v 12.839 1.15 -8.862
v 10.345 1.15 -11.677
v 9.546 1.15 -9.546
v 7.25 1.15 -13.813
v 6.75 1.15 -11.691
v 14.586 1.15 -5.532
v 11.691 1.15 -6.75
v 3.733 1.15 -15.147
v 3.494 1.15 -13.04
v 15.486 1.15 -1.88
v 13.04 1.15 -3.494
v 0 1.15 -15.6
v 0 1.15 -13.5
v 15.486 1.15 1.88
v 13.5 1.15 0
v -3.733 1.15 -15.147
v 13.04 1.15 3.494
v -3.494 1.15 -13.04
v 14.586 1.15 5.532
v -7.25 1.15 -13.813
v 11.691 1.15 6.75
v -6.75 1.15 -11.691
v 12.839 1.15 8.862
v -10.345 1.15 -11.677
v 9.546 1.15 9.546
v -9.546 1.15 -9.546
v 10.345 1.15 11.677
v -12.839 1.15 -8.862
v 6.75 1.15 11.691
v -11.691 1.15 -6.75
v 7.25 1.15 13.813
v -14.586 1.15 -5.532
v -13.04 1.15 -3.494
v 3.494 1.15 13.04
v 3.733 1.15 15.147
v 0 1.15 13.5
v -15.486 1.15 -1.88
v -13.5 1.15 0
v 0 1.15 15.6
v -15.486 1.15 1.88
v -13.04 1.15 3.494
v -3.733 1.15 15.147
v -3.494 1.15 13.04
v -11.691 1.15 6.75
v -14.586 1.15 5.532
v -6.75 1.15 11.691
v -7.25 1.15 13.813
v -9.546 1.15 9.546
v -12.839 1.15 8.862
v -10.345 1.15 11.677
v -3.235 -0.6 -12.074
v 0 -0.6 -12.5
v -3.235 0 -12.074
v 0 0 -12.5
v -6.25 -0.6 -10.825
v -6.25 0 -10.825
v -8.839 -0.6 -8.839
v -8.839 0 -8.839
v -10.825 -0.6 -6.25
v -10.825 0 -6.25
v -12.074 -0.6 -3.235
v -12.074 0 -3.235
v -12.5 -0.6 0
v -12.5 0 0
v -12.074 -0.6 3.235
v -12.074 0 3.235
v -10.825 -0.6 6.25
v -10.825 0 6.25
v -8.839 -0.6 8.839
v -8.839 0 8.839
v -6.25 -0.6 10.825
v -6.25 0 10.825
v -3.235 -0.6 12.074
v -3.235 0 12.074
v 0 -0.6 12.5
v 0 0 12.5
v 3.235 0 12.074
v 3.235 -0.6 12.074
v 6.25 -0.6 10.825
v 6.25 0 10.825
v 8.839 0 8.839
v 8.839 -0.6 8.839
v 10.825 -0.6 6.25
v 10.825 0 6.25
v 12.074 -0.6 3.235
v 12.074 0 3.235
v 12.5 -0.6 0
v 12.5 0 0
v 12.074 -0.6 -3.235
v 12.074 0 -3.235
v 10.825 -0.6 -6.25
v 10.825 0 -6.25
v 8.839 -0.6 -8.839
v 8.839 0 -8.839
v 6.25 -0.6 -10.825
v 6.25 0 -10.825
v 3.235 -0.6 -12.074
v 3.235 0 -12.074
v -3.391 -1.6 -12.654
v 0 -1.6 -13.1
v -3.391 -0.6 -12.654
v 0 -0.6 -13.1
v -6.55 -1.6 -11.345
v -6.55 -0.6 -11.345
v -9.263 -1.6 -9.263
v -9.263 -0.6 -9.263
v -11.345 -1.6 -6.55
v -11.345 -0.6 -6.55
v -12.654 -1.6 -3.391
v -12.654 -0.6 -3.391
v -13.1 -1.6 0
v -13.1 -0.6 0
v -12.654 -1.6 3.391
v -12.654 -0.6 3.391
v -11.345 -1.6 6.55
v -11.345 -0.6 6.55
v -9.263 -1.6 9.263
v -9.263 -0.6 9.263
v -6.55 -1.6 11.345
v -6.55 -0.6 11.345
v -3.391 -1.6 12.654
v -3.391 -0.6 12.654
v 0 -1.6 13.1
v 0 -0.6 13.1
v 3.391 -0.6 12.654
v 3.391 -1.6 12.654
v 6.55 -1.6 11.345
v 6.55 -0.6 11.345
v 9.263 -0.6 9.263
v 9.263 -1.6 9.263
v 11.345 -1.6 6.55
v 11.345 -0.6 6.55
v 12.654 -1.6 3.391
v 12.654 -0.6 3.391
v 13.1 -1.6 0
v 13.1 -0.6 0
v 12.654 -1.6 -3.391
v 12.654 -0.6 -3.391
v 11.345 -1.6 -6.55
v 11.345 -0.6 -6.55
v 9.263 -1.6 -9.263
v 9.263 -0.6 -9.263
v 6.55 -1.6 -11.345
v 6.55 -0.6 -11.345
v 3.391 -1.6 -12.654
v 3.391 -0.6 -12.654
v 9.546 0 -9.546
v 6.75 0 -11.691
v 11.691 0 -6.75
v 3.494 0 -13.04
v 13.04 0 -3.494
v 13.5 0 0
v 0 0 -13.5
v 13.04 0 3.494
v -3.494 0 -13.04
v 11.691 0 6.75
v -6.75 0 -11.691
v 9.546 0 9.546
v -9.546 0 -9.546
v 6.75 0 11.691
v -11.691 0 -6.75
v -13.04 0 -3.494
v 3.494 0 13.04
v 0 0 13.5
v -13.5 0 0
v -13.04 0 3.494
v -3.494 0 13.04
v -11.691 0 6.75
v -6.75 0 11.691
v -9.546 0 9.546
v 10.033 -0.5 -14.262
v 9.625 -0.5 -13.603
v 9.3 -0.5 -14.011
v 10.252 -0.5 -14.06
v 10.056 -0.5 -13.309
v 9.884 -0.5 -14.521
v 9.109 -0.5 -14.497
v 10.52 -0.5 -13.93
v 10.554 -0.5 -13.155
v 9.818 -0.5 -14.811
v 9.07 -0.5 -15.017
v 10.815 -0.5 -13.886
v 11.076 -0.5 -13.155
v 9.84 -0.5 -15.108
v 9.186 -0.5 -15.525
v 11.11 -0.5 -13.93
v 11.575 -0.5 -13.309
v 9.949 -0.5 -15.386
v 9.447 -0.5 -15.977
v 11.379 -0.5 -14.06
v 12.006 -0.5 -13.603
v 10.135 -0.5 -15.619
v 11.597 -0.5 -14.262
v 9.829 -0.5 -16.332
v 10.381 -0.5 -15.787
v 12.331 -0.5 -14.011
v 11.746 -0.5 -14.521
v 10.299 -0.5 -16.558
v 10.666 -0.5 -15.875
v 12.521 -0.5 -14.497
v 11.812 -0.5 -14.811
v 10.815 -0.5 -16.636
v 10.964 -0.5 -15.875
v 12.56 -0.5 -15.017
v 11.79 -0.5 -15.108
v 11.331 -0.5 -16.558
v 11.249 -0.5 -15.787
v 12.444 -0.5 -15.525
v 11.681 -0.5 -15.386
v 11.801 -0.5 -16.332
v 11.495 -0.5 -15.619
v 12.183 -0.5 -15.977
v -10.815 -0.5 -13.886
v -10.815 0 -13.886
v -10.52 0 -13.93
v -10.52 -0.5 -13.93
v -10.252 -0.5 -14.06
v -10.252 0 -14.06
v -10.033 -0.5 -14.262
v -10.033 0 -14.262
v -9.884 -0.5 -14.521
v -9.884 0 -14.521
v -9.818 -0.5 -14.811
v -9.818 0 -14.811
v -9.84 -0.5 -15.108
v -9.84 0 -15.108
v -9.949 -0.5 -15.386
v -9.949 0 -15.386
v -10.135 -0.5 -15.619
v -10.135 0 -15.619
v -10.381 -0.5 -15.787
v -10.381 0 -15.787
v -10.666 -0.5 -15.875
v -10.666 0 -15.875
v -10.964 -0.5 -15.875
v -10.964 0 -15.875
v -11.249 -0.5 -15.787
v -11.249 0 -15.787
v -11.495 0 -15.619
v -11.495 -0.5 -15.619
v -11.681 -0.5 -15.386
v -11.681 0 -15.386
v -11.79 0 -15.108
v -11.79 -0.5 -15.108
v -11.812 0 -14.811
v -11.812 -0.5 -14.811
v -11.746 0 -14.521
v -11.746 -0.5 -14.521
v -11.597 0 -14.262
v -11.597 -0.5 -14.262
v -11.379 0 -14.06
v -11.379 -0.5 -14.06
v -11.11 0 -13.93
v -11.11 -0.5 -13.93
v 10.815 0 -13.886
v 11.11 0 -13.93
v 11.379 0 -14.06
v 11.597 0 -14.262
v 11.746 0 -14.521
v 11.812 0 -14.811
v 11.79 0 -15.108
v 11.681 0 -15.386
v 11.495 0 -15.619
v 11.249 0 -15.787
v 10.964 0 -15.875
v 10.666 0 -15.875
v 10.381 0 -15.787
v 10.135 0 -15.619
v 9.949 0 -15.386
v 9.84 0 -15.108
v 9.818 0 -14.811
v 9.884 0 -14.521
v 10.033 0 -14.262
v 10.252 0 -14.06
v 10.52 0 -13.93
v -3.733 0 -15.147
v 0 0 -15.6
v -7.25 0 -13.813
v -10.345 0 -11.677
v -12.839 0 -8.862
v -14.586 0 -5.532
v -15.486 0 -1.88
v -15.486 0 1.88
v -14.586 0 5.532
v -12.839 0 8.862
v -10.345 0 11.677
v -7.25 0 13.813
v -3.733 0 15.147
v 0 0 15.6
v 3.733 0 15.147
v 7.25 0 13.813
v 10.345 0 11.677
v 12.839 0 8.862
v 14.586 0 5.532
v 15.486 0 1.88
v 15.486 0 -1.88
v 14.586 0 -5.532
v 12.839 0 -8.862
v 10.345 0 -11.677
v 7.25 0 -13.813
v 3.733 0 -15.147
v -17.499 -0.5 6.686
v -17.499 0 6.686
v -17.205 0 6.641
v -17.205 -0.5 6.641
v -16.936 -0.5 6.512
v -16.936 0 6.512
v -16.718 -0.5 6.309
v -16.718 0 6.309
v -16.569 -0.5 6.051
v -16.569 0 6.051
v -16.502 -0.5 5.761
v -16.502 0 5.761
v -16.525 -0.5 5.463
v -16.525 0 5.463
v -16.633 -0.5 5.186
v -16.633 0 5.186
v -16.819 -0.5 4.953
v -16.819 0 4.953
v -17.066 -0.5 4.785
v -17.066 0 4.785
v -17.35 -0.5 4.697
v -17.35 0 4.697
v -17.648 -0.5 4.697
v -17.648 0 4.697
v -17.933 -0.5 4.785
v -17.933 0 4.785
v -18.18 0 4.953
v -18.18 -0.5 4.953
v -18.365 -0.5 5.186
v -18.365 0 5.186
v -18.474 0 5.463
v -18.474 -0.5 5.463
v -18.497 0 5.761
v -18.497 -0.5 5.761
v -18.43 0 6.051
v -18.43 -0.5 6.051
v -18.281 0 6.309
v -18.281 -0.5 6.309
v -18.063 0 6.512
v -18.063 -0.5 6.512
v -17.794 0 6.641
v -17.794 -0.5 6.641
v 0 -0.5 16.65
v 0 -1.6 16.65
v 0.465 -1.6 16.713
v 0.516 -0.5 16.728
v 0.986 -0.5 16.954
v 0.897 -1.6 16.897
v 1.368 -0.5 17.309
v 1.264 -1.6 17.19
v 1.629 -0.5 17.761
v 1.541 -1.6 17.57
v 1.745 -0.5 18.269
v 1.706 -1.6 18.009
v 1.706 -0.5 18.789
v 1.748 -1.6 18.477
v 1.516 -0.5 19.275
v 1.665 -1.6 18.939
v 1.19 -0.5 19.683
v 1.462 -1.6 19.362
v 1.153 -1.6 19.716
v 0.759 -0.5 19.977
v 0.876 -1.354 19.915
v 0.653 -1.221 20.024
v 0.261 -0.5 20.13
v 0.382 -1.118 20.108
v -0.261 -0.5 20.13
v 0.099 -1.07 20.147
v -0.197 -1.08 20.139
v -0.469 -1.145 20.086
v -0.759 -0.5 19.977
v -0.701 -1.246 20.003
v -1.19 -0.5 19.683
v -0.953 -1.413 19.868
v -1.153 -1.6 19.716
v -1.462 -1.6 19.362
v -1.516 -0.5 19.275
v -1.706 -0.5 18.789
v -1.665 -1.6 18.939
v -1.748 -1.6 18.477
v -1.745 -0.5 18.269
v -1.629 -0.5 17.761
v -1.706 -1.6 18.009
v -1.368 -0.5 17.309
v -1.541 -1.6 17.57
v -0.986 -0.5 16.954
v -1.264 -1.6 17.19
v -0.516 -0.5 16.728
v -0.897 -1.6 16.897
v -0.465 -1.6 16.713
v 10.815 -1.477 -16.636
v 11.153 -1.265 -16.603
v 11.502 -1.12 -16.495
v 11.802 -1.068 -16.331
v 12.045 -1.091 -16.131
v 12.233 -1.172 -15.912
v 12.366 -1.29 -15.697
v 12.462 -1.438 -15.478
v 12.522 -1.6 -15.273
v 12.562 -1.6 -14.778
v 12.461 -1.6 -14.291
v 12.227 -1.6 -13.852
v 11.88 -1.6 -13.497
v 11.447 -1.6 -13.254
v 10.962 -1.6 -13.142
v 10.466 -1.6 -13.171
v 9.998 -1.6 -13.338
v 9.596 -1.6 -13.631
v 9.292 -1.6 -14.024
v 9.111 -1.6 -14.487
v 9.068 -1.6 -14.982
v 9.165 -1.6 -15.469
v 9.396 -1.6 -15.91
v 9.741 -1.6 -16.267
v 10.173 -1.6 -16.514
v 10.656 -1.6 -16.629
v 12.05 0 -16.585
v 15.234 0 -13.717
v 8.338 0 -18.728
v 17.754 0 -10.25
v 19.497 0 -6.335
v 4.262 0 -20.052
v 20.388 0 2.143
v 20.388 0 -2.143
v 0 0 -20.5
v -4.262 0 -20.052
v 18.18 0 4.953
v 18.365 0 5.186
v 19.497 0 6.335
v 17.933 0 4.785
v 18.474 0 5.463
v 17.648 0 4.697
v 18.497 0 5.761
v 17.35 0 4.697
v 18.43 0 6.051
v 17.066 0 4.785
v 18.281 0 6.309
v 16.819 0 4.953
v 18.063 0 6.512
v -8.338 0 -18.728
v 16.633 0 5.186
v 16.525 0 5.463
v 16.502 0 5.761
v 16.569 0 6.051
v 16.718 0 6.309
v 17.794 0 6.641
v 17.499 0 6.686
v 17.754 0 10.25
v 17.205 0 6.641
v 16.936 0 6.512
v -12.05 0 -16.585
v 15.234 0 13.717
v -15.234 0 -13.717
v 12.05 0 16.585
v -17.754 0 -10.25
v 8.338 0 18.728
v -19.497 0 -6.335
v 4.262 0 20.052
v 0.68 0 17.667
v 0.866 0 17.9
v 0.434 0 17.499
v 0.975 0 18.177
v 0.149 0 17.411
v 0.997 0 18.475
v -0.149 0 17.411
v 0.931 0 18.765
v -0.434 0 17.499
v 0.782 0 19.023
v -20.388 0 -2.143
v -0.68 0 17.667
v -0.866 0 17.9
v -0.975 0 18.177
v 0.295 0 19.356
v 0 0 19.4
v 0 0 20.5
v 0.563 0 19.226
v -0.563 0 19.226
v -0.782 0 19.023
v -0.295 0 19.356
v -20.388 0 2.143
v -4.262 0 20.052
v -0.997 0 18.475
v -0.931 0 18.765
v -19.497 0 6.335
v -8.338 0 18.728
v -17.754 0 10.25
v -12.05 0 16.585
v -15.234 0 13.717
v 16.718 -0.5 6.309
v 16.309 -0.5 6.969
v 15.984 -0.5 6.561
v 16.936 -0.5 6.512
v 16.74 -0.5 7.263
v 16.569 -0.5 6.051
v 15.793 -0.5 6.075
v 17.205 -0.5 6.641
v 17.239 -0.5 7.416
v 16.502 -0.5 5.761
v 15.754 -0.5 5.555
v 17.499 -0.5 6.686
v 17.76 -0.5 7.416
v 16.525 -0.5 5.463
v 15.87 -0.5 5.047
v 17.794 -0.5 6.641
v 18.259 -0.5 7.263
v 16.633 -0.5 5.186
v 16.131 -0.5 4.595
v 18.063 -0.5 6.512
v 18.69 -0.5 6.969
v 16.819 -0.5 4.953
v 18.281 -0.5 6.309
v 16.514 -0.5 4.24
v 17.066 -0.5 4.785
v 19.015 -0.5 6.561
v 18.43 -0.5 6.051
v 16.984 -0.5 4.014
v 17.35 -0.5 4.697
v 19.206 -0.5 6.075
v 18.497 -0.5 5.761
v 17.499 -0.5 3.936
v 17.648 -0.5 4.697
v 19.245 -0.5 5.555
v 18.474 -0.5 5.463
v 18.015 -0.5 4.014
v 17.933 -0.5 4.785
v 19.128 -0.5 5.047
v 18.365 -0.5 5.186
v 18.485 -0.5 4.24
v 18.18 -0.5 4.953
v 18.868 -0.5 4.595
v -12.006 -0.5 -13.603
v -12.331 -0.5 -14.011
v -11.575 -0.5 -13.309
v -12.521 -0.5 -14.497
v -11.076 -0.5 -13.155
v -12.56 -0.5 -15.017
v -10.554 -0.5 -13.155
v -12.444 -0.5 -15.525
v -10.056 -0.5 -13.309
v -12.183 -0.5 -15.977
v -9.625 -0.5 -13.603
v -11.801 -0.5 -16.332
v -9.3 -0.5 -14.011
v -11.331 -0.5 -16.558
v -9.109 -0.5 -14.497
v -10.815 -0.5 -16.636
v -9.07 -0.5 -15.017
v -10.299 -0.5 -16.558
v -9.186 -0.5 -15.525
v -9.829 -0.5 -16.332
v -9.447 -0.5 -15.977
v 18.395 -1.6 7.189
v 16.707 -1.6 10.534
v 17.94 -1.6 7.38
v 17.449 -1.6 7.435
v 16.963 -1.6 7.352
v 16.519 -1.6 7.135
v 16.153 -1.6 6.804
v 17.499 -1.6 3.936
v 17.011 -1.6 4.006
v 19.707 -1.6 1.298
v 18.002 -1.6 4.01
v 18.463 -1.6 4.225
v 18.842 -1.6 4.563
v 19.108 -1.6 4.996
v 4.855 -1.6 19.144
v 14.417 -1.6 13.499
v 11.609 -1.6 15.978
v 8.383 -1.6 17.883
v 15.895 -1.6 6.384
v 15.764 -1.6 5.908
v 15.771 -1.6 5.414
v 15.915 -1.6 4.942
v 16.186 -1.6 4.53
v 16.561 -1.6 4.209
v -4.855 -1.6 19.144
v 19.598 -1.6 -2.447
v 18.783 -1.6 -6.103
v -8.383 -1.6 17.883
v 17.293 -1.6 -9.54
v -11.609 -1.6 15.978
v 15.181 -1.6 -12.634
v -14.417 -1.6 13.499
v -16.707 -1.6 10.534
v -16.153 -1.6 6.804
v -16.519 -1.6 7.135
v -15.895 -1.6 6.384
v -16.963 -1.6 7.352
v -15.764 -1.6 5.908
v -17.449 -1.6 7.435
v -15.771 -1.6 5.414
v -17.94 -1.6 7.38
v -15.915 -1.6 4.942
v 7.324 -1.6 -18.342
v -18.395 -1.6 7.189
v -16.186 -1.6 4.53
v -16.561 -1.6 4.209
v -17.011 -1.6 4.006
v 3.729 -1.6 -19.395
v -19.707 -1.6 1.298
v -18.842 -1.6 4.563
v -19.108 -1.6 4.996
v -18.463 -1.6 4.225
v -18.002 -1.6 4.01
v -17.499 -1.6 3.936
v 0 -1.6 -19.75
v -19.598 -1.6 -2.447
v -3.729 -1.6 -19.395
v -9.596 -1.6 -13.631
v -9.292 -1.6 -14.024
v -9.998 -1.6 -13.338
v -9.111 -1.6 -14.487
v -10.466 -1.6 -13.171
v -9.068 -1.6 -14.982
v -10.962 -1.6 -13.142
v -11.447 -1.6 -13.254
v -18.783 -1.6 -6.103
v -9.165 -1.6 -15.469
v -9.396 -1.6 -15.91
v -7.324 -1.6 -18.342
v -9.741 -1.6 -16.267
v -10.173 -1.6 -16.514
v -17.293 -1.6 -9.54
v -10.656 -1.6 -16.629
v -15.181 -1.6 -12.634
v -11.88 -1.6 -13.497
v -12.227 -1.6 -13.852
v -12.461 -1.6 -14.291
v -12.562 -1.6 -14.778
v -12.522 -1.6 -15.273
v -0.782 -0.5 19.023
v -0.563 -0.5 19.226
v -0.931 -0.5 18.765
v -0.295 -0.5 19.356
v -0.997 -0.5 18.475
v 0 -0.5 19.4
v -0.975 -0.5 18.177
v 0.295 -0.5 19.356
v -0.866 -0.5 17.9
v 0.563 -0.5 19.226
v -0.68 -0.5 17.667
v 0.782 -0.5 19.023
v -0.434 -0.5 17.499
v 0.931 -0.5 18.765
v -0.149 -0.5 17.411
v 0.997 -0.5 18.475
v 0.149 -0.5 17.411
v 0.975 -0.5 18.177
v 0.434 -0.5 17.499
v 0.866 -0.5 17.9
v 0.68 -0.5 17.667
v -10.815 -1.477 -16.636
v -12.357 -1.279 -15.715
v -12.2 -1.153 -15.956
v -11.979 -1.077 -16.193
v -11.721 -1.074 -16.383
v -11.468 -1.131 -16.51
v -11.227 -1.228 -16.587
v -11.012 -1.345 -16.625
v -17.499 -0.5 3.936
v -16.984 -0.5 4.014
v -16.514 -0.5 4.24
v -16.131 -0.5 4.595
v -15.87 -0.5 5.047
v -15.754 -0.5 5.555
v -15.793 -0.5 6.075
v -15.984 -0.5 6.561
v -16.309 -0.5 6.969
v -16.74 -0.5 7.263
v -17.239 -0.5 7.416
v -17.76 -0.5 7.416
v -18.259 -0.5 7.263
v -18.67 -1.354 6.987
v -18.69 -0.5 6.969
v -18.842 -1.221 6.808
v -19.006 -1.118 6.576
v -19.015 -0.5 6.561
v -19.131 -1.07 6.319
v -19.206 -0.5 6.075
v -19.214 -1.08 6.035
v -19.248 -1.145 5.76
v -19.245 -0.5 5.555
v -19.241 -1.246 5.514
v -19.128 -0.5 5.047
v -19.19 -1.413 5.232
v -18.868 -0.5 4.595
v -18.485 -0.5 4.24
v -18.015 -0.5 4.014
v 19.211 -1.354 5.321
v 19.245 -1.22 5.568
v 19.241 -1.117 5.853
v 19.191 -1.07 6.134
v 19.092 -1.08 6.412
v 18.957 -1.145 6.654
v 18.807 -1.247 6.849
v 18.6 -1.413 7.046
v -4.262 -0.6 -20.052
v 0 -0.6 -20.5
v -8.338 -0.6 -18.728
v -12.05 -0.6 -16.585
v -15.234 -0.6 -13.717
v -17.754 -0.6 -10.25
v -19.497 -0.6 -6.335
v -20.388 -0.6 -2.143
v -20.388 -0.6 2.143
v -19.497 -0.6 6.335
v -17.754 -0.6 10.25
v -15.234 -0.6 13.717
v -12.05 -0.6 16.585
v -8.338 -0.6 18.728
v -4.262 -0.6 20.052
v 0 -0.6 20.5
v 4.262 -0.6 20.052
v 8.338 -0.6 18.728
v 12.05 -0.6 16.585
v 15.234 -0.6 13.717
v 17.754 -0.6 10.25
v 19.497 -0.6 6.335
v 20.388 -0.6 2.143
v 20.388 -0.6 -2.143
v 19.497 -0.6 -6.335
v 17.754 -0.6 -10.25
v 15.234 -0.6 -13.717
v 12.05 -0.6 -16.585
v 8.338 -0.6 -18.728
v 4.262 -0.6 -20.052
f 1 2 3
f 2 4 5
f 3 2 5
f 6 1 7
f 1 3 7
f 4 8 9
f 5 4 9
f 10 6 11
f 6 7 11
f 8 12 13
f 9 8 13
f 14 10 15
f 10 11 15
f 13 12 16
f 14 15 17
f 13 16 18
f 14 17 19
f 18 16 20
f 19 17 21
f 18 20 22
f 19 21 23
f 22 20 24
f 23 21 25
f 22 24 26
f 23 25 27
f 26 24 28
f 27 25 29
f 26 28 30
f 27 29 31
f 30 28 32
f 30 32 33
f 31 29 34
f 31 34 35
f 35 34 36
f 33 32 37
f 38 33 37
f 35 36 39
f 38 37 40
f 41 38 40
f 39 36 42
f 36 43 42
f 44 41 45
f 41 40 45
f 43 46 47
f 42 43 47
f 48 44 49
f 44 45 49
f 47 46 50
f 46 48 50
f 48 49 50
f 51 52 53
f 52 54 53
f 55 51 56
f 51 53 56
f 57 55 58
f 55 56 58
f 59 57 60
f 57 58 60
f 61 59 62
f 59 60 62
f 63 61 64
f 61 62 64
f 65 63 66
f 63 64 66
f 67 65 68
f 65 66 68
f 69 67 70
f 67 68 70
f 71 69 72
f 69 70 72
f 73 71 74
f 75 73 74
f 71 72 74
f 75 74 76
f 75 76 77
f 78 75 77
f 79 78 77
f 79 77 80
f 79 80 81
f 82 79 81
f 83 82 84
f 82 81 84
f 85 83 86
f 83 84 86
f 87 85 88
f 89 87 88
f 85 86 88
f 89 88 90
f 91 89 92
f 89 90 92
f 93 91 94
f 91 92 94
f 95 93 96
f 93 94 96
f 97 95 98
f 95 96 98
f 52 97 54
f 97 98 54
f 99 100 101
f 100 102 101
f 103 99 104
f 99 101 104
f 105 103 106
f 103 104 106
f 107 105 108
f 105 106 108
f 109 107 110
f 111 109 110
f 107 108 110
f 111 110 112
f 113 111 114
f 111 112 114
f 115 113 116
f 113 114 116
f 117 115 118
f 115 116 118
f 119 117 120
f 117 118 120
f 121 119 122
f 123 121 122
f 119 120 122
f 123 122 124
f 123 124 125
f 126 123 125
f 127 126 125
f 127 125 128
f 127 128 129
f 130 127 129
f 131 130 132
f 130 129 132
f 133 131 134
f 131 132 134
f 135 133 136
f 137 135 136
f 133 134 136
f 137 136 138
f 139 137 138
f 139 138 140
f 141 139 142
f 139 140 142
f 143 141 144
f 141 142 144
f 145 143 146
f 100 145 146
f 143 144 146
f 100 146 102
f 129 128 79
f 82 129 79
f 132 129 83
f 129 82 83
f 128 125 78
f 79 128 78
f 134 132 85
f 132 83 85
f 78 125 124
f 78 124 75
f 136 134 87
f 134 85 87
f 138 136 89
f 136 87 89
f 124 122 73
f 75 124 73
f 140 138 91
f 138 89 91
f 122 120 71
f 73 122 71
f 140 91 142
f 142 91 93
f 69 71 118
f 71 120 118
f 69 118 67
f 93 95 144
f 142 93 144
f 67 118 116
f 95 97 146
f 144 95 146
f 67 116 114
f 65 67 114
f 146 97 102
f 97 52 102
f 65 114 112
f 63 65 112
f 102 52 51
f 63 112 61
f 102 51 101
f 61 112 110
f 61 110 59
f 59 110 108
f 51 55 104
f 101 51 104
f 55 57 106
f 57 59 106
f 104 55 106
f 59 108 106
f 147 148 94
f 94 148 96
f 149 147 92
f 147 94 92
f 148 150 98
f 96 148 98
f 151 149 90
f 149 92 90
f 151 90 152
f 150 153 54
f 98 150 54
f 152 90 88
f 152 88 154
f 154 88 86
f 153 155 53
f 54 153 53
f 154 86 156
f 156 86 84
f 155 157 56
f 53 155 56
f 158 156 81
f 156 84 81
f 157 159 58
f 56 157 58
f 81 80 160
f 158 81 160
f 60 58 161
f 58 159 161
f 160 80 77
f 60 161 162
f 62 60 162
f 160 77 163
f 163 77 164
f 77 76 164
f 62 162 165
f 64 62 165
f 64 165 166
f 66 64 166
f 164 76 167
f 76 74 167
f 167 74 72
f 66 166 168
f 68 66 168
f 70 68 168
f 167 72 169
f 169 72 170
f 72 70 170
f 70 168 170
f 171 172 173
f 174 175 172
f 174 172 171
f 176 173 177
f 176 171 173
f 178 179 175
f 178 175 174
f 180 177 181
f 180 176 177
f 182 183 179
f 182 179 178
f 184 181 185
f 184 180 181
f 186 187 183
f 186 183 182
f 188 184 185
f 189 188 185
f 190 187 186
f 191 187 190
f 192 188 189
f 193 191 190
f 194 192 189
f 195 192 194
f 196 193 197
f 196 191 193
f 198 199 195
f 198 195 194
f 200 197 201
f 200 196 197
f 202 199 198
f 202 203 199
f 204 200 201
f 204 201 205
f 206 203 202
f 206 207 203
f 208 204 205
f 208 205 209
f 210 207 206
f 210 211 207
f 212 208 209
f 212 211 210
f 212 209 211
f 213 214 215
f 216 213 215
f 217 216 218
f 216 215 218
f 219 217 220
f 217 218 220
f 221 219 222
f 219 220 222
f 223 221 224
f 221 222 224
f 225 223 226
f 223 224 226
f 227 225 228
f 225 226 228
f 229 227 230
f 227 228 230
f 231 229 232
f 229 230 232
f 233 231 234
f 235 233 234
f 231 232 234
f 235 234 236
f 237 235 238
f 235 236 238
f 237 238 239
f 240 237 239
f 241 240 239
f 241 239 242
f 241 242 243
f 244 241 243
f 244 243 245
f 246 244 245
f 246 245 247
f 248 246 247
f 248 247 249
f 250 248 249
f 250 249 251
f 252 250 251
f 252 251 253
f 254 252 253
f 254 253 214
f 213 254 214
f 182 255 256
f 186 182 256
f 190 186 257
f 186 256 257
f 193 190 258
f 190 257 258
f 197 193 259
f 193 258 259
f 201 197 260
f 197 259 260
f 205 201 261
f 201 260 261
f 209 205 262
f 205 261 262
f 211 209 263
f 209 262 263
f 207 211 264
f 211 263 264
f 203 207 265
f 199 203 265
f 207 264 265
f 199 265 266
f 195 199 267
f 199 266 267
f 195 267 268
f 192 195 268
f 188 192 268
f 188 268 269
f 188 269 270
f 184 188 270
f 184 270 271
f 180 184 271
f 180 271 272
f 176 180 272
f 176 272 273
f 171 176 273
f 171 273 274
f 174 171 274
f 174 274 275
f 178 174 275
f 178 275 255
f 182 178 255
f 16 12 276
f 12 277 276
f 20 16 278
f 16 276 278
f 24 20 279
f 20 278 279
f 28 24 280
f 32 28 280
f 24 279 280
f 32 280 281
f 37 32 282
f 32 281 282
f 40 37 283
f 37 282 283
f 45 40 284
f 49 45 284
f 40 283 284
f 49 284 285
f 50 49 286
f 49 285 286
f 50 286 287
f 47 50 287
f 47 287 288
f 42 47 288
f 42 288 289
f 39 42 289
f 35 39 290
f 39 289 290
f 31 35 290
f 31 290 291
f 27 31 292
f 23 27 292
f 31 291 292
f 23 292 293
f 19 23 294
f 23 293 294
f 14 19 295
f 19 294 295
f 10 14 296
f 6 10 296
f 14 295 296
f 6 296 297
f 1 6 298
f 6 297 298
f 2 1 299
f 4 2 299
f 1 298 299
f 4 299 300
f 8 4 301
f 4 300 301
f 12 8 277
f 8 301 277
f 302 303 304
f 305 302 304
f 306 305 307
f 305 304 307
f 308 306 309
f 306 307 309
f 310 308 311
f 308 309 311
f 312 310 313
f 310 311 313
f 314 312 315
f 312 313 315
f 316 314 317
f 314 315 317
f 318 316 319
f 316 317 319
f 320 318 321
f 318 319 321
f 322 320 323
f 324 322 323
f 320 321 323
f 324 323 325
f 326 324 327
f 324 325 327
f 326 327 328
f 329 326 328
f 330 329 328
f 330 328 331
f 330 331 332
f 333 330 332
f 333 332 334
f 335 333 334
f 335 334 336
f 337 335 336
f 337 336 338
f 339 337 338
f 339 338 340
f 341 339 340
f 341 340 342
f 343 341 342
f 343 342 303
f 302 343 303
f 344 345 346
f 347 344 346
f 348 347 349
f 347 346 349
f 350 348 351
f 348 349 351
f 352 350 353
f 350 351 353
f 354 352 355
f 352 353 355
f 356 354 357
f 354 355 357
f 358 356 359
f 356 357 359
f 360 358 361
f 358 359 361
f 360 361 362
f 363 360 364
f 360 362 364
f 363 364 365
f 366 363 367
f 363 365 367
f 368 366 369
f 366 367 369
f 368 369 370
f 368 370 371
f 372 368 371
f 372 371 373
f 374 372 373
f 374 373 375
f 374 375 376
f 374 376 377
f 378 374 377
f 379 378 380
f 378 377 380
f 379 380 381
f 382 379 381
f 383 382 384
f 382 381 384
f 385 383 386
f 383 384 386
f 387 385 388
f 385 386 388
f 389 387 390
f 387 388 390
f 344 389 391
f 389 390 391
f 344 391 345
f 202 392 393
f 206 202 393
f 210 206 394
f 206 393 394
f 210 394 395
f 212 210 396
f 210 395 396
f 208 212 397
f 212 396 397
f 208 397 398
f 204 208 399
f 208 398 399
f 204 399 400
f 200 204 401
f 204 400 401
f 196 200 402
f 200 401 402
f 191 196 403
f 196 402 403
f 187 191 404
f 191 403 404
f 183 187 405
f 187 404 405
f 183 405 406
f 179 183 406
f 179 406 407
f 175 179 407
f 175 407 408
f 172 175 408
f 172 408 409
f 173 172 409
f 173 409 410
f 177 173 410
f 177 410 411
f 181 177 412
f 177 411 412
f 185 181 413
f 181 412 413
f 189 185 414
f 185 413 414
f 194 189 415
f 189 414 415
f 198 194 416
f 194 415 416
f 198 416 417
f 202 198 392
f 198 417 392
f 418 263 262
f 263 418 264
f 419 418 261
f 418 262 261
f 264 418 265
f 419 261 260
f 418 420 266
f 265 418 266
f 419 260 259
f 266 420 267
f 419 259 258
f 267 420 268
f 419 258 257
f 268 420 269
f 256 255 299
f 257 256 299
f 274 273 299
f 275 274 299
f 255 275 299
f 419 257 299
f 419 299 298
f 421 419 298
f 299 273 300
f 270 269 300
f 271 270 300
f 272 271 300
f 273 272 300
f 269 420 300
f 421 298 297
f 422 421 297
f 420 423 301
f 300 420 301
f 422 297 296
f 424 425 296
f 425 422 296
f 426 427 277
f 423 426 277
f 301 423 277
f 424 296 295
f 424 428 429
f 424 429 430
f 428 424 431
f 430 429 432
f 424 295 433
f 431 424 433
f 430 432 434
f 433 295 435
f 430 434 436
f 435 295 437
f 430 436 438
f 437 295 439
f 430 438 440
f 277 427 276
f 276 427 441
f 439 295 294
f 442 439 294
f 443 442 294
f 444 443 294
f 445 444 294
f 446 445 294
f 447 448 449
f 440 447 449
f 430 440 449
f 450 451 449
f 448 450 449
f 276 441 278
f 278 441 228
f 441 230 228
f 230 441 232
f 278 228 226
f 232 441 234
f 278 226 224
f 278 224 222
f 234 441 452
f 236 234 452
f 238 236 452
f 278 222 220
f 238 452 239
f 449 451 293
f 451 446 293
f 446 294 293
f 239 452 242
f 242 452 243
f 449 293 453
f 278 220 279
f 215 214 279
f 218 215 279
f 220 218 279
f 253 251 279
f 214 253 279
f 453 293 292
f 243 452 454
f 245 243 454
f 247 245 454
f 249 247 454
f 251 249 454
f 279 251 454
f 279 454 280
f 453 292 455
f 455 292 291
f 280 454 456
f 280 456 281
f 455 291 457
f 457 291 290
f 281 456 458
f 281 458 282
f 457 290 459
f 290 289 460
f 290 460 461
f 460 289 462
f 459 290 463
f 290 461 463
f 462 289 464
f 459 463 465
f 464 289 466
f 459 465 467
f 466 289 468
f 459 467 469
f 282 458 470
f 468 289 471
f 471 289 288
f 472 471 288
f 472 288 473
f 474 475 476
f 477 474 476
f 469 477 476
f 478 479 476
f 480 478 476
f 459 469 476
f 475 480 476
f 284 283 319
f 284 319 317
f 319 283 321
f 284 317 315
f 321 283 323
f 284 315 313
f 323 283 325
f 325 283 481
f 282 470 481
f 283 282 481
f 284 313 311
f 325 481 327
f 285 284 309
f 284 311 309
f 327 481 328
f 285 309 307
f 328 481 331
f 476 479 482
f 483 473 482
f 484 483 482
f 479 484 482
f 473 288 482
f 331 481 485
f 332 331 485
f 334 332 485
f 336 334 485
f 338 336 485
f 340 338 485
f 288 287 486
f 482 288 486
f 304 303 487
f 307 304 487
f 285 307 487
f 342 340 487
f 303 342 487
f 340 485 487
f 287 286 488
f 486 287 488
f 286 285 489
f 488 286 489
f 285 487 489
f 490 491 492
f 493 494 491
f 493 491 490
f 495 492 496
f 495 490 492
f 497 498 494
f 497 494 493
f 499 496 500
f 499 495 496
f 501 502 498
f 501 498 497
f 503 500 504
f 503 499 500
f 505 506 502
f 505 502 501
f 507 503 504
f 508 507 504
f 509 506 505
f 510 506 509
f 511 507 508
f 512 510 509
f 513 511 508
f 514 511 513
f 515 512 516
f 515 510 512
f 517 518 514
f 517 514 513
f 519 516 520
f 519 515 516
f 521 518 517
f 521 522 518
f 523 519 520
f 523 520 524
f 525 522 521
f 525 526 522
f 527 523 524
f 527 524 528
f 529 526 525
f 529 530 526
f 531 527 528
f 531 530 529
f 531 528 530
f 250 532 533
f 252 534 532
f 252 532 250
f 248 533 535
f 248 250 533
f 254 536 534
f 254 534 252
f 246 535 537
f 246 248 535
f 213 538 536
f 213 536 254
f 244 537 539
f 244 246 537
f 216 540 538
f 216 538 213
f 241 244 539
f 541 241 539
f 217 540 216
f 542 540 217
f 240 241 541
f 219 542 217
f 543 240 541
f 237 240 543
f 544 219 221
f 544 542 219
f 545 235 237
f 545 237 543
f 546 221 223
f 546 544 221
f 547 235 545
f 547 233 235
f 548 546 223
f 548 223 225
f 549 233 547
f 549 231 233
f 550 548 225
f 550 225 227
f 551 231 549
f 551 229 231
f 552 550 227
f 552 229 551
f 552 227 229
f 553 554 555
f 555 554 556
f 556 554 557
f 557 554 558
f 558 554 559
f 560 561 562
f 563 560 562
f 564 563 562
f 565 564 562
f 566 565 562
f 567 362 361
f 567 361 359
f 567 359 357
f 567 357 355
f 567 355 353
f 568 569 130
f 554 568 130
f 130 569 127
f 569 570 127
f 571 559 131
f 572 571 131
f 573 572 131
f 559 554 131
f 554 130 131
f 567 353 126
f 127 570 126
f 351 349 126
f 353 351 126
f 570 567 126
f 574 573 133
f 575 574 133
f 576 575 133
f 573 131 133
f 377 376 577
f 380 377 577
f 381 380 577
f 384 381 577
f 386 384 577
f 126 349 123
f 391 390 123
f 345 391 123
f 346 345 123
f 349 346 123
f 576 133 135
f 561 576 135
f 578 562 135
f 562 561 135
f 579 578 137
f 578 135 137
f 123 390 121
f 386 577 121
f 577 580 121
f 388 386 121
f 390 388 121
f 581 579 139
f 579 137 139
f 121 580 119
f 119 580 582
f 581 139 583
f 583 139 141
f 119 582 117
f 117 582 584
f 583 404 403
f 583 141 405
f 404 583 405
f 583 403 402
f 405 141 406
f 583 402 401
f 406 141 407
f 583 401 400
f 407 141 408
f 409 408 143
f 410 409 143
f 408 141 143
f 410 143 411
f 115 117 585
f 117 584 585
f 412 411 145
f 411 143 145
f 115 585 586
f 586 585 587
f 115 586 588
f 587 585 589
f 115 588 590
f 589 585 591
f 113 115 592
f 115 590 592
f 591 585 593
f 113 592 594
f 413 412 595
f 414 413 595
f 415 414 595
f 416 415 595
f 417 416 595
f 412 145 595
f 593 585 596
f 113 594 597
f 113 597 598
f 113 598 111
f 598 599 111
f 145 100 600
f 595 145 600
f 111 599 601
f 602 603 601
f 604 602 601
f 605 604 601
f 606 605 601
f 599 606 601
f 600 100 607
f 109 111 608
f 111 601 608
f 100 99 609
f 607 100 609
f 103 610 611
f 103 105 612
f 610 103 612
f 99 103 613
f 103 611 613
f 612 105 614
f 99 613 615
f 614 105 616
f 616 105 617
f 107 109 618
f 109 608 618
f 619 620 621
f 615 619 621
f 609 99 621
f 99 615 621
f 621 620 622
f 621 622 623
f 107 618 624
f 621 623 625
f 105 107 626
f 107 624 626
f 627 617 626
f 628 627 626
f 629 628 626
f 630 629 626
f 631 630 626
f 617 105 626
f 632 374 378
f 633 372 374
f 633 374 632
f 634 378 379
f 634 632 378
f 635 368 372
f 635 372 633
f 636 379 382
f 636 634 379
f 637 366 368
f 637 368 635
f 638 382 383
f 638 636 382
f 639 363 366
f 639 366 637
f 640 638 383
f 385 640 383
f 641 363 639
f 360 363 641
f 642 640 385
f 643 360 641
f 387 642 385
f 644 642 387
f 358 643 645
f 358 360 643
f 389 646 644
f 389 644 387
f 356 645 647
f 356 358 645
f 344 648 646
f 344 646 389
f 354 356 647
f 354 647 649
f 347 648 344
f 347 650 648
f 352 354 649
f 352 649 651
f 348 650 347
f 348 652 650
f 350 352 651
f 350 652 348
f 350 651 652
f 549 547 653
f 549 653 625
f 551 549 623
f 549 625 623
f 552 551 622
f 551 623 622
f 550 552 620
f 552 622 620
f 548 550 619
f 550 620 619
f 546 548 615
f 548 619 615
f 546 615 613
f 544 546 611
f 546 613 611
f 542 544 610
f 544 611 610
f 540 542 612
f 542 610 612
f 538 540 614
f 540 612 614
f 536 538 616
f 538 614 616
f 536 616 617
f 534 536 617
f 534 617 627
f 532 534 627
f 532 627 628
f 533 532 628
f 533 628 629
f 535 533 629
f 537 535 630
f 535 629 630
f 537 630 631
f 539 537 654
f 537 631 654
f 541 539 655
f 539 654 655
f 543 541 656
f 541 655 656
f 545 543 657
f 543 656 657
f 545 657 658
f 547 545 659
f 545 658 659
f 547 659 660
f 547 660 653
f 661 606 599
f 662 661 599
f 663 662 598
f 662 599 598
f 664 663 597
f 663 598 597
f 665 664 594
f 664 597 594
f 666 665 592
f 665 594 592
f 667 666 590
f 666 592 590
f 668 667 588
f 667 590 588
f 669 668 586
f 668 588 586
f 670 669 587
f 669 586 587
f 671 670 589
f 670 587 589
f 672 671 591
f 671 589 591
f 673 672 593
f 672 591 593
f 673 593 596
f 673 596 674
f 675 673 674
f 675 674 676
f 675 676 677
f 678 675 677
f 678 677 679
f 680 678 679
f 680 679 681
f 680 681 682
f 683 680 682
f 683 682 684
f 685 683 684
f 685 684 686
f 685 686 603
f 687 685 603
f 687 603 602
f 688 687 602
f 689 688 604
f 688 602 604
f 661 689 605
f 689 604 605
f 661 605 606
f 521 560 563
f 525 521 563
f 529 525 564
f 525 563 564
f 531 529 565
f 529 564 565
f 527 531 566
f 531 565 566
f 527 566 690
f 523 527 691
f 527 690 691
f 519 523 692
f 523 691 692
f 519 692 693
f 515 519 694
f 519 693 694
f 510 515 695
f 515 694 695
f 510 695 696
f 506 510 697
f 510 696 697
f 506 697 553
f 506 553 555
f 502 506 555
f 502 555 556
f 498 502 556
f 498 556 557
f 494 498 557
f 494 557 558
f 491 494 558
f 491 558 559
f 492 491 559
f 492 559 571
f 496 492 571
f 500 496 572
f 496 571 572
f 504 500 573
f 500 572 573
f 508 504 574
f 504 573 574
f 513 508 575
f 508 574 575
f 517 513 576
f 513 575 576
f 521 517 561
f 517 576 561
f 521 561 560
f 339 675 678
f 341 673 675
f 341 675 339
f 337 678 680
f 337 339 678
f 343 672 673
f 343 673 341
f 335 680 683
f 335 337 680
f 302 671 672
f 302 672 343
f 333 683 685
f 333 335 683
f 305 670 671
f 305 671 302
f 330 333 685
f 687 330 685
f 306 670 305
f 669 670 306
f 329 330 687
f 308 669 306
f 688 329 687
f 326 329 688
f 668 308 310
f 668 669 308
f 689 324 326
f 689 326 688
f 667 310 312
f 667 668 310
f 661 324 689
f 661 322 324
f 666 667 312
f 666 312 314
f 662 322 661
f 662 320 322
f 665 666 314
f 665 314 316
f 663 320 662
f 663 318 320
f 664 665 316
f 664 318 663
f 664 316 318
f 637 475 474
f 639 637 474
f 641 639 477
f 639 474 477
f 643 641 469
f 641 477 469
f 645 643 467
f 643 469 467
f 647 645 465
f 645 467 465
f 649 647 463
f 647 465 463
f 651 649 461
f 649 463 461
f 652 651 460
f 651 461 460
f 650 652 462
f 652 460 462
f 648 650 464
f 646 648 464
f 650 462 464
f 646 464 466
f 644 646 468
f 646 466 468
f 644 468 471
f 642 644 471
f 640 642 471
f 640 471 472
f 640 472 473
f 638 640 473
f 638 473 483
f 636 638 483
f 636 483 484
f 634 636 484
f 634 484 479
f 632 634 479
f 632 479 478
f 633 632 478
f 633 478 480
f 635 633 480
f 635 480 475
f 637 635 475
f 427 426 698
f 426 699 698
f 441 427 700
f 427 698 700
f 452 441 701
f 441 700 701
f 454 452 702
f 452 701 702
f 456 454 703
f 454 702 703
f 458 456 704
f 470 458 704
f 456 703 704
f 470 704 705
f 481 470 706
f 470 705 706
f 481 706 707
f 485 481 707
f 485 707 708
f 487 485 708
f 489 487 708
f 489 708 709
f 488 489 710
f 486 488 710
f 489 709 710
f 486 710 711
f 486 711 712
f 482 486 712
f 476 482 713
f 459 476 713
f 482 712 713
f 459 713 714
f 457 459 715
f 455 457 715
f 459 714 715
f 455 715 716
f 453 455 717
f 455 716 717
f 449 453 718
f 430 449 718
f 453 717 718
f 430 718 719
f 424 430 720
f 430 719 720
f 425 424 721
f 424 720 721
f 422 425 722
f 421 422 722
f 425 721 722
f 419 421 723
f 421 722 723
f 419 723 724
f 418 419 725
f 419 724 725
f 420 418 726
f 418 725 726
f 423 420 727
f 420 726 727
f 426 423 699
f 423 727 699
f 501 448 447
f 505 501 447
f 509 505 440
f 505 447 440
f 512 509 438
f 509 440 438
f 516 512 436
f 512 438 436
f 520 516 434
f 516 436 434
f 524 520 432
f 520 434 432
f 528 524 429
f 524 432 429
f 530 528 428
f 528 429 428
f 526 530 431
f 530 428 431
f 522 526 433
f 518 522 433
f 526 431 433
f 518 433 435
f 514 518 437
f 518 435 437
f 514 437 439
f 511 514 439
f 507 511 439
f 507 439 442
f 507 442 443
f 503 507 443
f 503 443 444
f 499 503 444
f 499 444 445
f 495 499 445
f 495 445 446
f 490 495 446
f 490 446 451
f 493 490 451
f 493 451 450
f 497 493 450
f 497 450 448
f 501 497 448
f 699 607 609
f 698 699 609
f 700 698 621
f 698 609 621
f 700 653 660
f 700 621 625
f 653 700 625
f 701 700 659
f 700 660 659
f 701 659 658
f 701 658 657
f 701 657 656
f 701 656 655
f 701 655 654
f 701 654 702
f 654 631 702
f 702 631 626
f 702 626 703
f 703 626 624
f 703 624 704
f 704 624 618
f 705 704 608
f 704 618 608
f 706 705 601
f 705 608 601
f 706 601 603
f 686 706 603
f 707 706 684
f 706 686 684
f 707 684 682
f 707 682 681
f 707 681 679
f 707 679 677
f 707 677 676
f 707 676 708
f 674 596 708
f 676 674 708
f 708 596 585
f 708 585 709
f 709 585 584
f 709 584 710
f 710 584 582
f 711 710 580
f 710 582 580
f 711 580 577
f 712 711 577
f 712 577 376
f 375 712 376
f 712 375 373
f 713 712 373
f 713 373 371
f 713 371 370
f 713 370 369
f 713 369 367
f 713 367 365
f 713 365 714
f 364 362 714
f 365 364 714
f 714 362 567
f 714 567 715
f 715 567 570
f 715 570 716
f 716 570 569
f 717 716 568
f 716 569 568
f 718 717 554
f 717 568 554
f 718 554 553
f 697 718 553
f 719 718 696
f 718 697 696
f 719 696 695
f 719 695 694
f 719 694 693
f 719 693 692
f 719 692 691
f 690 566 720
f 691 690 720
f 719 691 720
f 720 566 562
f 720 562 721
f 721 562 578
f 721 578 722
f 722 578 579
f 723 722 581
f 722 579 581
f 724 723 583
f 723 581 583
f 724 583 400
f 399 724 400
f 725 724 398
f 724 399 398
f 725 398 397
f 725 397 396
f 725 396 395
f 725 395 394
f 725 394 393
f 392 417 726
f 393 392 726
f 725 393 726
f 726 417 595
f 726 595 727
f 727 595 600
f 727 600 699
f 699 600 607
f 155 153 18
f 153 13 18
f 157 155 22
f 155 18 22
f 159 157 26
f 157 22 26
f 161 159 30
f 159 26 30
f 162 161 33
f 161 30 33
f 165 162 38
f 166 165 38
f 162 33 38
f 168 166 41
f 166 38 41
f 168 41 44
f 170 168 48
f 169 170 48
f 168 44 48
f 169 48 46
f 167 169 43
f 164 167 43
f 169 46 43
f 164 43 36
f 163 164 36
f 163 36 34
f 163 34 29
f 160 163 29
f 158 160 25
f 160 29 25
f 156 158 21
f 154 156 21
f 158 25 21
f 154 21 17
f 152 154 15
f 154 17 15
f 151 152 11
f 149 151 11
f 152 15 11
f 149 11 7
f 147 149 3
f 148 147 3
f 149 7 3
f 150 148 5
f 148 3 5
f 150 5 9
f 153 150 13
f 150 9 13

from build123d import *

# Parameters (mm, degrees)
ESQUISSE2_R             = 1
ENL_V_MAT_EXTRU_1_DEPTH = 2.6
ESQUISSE3_R             = 1.75
ENL_V_MAT_EXTRU_2_DEPTH = 1.1


with BuildPart() as part:
    # Esquisse1 → Révolution1 (revolve)
    with BuildSketch(Plane(origin=(0, 0, 0), x_dir=(0, 0, -1), z_dir=(1, 0, 0)), mode=Mode.PRIVATE) as r_volution1_sk:
        Polygon((-13.5, 0), (-13.5, 1.15), (-15.6, 1.15), (-15.6, 0), (-20.5, 0), (-20.5, -0.6), (-19.75, -1.6), (-13.1, -1.6), (-13.1, -0.6), (-12.5, -0.6), (-12.5, 0), align=None)
    revolve(r_volution1_sk.sketch.rotate(Axis((0, -40.878639624, 0), (0, 1, 0)), 180), axis=Axis((0, -40.878639624, 0), (0, 1, 0)))  # turned: the seam where the file's is

    # Esquisse2 → Enlèv. mat.-Extru.1 (cut, through all)
    with BuildSketch(Plane(origin=(0, 0, 0), x_dir=(1, 0, 0), z_dir=(0, 1, 0))):
        with Locations(Location((0, -18.4, 0), (0, 0, 270))):  # turned: the seam where the file's is
            Circle(ESQUISSE2_R)
        with Locations(Location((17.4994399, -5.685912696, 0), (0, 0, 270))):  # turned: the seam where the file's is
            Circle(ESQUISSE2_R)
        with Locations(Location((10.815248642, 14.885912696, 0), (0, 0, 270))):  # turned: the seam where the file's is
            Circle(ESQUISSE2_R)
        with Locations(Location((-10.815248642, 14.885912696, 0), (0, 0, 270))):  # turned: the seam where the file's is
            Circle(ESQUISSE2_R)
        with Locations(Location((-17.4994399, -5.685912696, 0), (0, 0, 270))):  # turned: the seam where the file's is
            Circle(ESQUISSE2_R)
    extrude(amount=-ENL_V_MAT_EXTRU_1_DEPTH, mode=Mode.SUBTRACT)

    # Esquisse3 → Enlèv. mat.-Extru.2 (cut)
    with BuildSketch(Plane.XZ.offset(1.6)):
        with Locations(Location((0, 18.4, 0), (0, 0, 270))):  # turned: the seam where the file's is
            Circle(ESQUISSE3_R)
        with Locations(Location((17.4994399, 5.685912696, 0), (0, 0, 270))):  # turned: the seam where the file's is
            Circle(ESQUISSE3_R)
        with Locations(Location((10.815248642, -14.885912696, 0), (0, 0, 270))):  # turned: the seam where the file's is
            Circle(ESQUISSE3_R)
        with Locations(Location((-10.815248642, -14.885912696, 0), (0, 0, 270))):  # turned: the seam where the file's is
            Circle(ESQUISSE3_R)
        with Locations(Location((-17.4994399, 5.685912696, 0), (0, 0, 270))):  # turned: the seam where the file's is
            Circle(ESQUISSE3_R)
    extrude(amount=-ENL_V_MAT_EXTRU_2_DEPTH, mode=Mode.SUBTRACT)


solid = part.part
